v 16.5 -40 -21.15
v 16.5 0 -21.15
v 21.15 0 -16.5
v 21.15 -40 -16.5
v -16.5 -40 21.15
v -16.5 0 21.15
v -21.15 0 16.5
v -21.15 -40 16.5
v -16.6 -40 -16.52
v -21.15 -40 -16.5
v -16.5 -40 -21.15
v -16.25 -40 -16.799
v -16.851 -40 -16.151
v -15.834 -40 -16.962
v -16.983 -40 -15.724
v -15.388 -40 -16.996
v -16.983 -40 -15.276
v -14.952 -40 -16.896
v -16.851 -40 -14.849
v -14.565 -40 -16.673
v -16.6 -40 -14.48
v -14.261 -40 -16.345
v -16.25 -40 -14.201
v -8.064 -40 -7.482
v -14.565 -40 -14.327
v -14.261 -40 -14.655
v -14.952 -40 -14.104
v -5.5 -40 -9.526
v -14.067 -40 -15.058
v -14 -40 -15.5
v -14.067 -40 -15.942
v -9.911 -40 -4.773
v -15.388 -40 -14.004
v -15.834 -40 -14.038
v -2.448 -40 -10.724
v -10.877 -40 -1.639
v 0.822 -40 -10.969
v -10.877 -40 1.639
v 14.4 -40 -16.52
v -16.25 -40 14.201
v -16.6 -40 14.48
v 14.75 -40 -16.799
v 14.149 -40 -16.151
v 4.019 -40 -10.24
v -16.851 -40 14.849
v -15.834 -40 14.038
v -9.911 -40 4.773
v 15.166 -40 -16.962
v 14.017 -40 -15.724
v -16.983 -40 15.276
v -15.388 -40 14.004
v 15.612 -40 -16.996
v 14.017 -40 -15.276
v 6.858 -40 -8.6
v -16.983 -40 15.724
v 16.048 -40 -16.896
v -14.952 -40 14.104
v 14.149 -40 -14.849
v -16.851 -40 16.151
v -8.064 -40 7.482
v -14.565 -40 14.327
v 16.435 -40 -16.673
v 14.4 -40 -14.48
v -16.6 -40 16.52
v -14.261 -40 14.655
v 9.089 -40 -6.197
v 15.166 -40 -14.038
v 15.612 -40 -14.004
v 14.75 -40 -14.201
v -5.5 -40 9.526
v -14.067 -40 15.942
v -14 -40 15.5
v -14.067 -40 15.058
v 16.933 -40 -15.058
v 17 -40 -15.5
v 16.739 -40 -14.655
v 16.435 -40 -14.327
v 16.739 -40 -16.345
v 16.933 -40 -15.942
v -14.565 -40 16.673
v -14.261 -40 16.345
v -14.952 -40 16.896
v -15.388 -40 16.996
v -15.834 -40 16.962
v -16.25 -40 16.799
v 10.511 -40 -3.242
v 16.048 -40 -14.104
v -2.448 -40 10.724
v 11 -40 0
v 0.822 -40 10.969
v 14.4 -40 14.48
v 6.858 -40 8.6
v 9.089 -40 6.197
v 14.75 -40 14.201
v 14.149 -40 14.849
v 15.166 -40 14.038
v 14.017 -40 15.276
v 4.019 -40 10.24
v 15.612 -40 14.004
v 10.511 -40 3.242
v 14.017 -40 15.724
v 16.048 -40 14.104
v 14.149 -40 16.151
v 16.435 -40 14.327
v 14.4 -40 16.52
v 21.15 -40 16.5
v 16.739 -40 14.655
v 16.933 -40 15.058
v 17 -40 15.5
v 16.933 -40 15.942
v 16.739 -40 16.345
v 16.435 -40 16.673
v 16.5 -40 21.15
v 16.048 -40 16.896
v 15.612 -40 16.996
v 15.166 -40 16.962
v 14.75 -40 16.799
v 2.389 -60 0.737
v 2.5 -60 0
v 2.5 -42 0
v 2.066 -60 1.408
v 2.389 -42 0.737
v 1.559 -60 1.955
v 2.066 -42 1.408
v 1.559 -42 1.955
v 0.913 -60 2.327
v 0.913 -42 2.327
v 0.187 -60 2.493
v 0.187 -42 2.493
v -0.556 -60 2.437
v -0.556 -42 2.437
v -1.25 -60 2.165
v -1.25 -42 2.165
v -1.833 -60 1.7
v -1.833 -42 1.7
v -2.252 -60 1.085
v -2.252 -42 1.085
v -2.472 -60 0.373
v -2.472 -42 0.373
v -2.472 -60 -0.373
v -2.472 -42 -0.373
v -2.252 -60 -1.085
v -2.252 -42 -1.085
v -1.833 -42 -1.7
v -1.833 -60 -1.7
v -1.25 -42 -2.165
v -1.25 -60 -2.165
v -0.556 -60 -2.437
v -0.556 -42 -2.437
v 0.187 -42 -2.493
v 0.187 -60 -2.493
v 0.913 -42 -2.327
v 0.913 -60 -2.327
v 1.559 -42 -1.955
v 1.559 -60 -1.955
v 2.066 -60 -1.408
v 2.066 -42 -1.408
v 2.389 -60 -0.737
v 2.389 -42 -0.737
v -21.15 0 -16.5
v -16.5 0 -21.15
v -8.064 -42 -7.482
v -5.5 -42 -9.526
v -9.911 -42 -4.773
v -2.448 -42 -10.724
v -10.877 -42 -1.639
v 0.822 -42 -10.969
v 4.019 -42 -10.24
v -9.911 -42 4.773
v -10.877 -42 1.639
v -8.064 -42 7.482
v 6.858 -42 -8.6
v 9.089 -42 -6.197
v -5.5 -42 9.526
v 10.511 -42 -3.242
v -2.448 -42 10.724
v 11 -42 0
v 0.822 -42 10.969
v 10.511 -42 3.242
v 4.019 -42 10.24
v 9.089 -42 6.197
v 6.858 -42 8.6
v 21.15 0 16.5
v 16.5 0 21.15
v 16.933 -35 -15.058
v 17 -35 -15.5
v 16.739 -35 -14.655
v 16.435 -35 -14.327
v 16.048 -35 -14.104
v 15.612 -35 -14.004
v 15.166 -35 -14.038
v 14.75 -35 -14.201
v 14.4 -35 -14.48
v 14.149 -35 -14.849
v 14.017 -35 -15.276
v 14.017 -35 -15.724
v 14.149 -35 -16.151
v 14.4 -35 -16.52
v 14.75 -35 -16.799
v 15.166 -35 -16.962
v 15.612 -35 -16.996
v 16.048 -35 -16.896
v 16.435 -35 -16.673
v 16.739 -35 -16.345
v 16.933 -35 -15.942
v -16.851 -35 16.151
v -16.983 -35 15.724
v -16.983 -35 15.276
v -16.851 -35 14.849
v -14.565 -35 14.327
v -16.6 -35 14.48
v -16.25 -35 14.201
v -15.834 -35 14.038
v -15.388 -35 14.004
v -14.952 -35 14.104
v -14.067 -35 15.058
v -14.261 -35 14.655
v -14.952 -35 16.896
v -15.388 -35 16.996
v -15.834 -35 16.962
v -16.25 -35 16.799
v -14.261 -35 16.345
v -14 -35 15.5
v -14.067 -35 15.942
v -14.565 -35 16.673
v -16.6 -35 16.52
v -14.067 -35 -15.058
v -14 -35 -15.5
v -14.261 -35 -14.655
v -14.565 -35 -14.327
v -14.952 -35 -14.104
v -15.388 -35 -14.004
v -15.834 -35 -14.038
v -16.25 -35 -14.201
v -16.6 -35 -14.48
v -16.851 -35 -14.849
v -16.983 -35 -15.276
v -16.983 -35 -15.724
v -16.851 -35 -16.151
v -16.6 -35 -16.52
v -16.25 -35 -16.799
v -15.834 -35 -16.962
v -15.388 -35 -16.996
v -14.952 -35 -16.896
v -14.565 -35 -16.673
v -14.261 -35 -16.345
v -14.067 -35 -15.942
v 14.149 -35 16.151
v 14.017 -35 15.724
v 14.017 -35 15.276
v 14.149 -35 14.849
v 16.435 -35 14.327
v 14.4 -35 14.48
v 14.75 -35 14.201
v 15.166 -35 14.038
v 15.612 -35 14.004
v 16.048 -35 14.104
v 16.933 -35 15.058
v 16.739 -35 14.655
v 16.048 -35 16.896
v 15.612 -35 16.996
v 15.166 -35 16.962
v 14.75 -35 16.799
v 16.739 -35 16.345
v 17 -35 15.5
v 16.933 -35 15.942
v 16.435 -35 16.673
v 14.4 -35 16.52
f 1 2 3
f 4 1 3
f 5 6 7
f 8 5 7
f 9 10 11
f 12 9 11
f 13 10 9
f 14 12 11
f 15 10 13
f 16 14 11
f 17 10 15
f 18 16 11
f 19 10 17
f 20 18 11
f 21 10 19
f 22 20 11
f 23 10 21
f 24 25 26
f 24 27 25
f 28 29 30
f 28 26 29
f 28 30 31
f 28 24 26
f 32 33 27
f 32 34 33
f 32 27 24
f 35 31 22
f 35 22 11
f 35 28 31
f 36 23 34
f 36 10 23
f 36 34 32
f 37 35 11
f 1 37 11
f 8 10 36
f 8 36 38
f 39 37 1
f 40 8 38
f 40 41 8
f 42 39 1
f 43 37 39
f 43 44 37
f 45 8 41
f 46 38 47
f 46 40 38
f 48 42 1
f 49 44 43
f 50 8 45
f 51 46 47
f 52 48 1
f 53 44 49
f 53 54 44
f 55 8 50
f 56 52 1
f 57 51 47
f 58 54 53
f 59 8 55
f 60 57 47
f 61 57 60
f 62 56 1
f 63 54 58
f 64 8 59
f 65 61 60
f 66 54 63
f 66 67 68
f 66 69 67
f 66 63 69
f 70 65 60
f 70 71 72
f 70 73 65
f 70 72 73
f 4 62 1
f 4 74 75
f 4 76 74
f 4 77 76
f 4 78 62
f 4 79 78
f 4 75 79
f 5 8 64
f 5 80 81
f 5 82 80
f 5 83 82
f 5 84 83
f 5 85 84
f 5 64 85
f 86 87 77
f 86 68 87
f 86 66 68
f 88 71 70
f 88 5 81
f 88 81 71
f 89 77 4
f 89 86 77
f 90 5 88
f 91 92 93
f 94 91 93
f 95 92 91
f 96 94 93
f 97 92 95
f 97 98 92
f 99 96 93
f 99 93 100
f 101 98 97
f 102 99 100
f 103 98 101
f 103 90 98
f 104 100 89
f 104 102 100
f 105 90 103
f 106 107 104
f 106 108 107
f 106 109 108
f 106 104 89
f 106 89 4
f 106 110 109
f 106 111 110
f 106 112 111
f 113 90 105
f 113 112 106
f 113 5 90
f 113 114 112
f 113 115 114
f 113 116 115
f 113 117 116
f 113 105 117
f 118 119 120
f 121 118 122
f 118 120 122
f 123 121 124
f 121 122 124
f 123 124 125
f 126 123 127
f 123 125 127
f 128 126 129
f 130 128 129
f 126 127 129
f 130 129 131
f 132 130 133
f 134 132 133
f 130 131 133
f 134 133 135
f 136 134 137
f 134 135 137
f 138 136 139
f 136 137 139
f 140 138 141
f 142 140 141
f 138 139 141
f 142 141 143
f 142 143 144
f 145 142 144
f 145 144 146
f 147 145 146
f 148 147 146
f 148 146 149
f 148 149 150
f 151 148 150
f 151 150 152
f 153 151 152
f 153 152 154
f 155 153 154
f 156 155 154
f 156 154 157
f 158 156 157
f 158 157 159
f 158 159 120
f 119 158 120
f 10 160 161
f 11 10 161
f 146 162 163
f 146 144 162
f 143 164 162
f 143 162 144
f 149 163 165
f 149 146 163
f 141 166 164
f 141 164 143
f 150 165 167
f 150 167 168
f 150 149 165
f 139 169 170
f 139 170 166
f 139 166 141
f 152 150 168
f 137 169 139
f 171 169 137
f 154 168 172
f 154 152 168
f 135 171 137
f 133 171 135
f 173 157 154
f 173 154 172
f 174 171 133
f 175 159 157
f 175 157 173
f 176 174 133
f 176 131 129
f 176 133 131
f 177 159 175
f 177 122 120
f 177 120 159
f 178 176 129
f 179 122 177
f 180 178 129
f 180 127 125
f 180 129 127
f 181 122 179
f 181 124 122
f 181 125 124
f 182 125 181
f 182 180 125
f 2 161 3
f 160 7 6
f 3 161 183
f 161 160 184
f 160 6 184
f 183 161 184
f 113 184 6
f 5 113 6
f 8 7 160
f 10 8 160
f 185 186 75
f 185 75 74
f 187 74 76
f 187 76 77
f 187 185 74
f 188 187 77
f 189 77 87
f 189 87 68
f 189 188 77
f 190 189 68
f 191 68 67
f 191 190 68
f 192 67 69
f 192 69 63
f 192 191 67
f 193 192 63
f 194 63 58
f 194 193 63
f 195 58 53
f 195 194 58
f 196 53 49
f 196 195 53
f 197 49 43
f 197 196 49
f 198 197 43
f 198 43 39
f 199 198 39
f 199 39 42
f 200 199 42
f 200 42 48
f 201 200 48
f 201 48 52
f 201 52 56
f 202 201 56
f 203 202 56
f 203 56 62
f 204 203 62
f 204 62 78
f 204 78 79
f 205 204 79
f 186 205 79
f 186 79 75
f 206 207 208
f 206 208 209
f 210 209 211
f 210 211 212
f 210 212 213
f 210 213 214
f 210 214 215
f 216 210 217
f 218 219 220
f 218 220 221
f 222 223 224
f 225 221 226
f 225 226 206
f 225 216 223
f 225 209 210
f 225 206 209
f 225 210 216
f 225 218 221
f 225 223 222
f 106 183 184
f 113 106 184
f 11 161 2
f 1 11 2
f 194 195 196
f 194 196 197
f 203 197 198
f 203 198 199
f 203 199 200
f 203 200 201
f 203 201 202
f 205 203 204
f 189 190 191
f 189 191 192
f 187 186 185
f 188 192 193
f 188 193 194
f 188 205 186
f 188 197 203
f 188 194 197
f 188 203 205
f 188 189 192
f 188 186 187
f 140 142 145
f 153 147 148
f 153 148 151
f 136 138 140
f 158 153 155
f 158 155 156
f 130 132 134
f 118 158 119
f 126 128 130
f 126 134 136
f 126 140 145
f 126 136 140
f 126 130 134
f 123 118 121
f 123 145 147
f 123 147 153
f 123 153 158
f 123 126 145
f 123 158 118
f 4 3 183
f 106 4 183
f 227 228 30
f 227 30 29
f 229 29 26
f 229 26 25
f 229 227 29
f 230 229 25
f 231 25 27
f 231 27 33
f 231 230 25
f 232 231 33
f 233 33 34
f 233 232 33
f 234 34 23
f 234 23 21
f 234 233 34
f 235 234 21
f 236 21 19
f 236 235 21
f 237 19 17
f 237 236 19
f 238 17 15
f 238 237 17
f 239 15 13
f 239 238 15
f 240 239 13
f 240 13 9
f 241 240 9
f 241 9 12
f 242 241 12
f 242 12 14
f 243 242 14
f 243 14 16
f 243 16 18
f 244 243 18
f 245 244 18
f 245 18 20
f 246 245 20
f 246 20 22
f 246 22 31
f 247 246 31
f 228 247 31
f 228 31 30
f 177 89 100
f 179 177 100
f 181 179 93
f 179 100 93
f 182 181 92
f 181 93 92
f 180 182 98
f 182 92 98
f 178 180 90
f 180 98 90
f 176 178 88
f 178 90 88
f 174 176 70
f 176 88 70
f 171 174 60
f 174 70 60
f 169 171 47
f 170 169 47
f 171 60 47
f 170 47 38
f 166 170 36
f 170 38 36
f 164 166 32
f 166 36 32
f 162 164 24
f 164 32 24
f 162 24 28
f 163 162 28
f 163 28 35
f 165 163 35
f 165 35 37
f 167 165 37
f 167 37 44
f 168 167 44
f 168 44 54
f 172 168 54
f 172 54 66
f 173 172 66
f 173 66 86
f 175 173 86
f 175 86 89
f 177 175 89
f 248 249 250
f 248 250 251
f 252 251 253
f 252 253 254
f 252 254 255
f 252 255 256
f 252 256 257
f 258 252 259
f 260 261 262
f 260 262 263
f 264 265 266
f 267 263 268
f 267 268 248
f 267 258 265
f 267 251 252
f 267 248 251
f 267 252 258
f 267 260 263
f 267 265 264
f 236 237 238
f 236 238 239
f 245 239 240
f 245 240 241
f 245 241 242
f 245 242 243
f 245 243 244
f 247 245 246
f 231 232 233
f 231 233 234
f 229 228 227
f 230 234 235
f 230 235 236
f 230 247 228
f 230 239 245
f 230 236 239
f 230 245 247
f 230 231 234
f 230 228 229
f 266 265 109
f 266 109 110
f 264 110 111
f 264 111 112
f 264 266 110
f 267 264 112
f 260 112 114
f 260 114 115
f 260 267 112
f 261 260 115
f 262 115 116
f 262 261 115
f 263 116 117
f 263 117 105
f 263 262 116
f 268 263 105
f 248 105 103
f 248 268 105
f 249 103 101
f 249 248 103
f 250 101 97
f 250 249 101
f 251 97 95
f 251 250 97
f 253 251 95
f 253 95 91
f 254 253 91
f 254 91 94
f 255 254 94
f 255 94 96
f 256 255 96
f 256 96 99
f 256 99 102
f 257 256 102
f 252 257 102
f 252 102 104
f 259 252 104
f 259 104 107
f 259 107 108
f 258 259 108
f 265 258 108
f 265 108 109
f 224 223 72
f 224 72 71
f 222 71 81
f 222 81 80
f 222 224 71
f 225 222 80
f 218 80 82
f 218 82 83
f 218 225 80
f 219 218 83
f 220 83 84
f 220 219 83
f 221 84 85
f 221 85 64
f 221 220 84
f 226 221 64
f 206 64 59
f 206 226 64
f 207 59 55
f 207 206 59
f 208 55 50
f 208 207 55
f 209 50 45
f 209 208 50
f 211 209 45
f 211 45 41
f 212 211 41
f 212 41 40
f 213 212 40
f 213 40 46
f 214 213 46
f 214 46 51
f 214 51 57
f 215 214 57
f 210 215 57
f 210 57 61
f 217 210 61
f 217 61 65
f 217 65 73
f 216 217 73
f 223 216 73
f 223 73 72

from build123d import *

# Parameters (mm, degrees)
F0_R     = 1.5
F0_R_2   = 11
F1_DEPTH = 40
F0_R_3   = 2.5
F2_DEPTH = 42
F3_DEPTH = 60
F4_DEPTH = 35


with BuildPart() as f1:
    # F0 (on Front) → F1 (new body)
    with BuildSketch(Plane.XZ):
        Polygon((-16.5, -21.15), (16.5, -21.15), (21.15, -16.5), (21.15, 16.5), (16.5, 21.15), (-16.5, 21.15), (-21.15, 16.5), (-21.15, -16.5), align=None)
        with Locations((-15.5, -15.5)):
            Circle(F0_R, mode=Mode.SUBTRACT)
        with Locations((15.5, -15.5)):
            Circle(F0_R, mode=Mode.SUBTRACT)
        with Locations((-15.5, 15.5)):
            Circle(F0_R, mode=Mode.SUBTRACT)
        Circle(F0_R_2, mode=Mode.SUBTRACT)
        with Locations((15.5, 15.5)):
            Circle(F0_R, mode=Mode.SUBTRACT)
    extrude(amount=F1_DEPTH)

    # F0 (on Front) → F2 (join)
    with BuildSketch(Plane.XZ):
        Circle(F0_R_2)
        Circle(F0_R_3, mode=Mode.SUBTRACT)
    extrude(amount=F2_DEPTH)

    # F0 (on Front) → F3 (join)
    with BuildSketch(Plane.XZ):
        Circle(F0_R_3)
    extrude(amount=F3_DEPTH)

    # F0 (on Front) → F4 (join)
    with BuildSketch(Plane.XZ):
        with Locations((15.5, 15.5)):
            Circle(F0_R)
        with Locations((-15.5, 15.5)):
            Circle(F0_R)
        with Locations((-15.5, -15.5)):
            Circle(F0_R)
        with Locations((15.5, -15.5)):
            Circle(F0_R)
    extrude(amount=F4_DEPTH)


solid = f1.part
